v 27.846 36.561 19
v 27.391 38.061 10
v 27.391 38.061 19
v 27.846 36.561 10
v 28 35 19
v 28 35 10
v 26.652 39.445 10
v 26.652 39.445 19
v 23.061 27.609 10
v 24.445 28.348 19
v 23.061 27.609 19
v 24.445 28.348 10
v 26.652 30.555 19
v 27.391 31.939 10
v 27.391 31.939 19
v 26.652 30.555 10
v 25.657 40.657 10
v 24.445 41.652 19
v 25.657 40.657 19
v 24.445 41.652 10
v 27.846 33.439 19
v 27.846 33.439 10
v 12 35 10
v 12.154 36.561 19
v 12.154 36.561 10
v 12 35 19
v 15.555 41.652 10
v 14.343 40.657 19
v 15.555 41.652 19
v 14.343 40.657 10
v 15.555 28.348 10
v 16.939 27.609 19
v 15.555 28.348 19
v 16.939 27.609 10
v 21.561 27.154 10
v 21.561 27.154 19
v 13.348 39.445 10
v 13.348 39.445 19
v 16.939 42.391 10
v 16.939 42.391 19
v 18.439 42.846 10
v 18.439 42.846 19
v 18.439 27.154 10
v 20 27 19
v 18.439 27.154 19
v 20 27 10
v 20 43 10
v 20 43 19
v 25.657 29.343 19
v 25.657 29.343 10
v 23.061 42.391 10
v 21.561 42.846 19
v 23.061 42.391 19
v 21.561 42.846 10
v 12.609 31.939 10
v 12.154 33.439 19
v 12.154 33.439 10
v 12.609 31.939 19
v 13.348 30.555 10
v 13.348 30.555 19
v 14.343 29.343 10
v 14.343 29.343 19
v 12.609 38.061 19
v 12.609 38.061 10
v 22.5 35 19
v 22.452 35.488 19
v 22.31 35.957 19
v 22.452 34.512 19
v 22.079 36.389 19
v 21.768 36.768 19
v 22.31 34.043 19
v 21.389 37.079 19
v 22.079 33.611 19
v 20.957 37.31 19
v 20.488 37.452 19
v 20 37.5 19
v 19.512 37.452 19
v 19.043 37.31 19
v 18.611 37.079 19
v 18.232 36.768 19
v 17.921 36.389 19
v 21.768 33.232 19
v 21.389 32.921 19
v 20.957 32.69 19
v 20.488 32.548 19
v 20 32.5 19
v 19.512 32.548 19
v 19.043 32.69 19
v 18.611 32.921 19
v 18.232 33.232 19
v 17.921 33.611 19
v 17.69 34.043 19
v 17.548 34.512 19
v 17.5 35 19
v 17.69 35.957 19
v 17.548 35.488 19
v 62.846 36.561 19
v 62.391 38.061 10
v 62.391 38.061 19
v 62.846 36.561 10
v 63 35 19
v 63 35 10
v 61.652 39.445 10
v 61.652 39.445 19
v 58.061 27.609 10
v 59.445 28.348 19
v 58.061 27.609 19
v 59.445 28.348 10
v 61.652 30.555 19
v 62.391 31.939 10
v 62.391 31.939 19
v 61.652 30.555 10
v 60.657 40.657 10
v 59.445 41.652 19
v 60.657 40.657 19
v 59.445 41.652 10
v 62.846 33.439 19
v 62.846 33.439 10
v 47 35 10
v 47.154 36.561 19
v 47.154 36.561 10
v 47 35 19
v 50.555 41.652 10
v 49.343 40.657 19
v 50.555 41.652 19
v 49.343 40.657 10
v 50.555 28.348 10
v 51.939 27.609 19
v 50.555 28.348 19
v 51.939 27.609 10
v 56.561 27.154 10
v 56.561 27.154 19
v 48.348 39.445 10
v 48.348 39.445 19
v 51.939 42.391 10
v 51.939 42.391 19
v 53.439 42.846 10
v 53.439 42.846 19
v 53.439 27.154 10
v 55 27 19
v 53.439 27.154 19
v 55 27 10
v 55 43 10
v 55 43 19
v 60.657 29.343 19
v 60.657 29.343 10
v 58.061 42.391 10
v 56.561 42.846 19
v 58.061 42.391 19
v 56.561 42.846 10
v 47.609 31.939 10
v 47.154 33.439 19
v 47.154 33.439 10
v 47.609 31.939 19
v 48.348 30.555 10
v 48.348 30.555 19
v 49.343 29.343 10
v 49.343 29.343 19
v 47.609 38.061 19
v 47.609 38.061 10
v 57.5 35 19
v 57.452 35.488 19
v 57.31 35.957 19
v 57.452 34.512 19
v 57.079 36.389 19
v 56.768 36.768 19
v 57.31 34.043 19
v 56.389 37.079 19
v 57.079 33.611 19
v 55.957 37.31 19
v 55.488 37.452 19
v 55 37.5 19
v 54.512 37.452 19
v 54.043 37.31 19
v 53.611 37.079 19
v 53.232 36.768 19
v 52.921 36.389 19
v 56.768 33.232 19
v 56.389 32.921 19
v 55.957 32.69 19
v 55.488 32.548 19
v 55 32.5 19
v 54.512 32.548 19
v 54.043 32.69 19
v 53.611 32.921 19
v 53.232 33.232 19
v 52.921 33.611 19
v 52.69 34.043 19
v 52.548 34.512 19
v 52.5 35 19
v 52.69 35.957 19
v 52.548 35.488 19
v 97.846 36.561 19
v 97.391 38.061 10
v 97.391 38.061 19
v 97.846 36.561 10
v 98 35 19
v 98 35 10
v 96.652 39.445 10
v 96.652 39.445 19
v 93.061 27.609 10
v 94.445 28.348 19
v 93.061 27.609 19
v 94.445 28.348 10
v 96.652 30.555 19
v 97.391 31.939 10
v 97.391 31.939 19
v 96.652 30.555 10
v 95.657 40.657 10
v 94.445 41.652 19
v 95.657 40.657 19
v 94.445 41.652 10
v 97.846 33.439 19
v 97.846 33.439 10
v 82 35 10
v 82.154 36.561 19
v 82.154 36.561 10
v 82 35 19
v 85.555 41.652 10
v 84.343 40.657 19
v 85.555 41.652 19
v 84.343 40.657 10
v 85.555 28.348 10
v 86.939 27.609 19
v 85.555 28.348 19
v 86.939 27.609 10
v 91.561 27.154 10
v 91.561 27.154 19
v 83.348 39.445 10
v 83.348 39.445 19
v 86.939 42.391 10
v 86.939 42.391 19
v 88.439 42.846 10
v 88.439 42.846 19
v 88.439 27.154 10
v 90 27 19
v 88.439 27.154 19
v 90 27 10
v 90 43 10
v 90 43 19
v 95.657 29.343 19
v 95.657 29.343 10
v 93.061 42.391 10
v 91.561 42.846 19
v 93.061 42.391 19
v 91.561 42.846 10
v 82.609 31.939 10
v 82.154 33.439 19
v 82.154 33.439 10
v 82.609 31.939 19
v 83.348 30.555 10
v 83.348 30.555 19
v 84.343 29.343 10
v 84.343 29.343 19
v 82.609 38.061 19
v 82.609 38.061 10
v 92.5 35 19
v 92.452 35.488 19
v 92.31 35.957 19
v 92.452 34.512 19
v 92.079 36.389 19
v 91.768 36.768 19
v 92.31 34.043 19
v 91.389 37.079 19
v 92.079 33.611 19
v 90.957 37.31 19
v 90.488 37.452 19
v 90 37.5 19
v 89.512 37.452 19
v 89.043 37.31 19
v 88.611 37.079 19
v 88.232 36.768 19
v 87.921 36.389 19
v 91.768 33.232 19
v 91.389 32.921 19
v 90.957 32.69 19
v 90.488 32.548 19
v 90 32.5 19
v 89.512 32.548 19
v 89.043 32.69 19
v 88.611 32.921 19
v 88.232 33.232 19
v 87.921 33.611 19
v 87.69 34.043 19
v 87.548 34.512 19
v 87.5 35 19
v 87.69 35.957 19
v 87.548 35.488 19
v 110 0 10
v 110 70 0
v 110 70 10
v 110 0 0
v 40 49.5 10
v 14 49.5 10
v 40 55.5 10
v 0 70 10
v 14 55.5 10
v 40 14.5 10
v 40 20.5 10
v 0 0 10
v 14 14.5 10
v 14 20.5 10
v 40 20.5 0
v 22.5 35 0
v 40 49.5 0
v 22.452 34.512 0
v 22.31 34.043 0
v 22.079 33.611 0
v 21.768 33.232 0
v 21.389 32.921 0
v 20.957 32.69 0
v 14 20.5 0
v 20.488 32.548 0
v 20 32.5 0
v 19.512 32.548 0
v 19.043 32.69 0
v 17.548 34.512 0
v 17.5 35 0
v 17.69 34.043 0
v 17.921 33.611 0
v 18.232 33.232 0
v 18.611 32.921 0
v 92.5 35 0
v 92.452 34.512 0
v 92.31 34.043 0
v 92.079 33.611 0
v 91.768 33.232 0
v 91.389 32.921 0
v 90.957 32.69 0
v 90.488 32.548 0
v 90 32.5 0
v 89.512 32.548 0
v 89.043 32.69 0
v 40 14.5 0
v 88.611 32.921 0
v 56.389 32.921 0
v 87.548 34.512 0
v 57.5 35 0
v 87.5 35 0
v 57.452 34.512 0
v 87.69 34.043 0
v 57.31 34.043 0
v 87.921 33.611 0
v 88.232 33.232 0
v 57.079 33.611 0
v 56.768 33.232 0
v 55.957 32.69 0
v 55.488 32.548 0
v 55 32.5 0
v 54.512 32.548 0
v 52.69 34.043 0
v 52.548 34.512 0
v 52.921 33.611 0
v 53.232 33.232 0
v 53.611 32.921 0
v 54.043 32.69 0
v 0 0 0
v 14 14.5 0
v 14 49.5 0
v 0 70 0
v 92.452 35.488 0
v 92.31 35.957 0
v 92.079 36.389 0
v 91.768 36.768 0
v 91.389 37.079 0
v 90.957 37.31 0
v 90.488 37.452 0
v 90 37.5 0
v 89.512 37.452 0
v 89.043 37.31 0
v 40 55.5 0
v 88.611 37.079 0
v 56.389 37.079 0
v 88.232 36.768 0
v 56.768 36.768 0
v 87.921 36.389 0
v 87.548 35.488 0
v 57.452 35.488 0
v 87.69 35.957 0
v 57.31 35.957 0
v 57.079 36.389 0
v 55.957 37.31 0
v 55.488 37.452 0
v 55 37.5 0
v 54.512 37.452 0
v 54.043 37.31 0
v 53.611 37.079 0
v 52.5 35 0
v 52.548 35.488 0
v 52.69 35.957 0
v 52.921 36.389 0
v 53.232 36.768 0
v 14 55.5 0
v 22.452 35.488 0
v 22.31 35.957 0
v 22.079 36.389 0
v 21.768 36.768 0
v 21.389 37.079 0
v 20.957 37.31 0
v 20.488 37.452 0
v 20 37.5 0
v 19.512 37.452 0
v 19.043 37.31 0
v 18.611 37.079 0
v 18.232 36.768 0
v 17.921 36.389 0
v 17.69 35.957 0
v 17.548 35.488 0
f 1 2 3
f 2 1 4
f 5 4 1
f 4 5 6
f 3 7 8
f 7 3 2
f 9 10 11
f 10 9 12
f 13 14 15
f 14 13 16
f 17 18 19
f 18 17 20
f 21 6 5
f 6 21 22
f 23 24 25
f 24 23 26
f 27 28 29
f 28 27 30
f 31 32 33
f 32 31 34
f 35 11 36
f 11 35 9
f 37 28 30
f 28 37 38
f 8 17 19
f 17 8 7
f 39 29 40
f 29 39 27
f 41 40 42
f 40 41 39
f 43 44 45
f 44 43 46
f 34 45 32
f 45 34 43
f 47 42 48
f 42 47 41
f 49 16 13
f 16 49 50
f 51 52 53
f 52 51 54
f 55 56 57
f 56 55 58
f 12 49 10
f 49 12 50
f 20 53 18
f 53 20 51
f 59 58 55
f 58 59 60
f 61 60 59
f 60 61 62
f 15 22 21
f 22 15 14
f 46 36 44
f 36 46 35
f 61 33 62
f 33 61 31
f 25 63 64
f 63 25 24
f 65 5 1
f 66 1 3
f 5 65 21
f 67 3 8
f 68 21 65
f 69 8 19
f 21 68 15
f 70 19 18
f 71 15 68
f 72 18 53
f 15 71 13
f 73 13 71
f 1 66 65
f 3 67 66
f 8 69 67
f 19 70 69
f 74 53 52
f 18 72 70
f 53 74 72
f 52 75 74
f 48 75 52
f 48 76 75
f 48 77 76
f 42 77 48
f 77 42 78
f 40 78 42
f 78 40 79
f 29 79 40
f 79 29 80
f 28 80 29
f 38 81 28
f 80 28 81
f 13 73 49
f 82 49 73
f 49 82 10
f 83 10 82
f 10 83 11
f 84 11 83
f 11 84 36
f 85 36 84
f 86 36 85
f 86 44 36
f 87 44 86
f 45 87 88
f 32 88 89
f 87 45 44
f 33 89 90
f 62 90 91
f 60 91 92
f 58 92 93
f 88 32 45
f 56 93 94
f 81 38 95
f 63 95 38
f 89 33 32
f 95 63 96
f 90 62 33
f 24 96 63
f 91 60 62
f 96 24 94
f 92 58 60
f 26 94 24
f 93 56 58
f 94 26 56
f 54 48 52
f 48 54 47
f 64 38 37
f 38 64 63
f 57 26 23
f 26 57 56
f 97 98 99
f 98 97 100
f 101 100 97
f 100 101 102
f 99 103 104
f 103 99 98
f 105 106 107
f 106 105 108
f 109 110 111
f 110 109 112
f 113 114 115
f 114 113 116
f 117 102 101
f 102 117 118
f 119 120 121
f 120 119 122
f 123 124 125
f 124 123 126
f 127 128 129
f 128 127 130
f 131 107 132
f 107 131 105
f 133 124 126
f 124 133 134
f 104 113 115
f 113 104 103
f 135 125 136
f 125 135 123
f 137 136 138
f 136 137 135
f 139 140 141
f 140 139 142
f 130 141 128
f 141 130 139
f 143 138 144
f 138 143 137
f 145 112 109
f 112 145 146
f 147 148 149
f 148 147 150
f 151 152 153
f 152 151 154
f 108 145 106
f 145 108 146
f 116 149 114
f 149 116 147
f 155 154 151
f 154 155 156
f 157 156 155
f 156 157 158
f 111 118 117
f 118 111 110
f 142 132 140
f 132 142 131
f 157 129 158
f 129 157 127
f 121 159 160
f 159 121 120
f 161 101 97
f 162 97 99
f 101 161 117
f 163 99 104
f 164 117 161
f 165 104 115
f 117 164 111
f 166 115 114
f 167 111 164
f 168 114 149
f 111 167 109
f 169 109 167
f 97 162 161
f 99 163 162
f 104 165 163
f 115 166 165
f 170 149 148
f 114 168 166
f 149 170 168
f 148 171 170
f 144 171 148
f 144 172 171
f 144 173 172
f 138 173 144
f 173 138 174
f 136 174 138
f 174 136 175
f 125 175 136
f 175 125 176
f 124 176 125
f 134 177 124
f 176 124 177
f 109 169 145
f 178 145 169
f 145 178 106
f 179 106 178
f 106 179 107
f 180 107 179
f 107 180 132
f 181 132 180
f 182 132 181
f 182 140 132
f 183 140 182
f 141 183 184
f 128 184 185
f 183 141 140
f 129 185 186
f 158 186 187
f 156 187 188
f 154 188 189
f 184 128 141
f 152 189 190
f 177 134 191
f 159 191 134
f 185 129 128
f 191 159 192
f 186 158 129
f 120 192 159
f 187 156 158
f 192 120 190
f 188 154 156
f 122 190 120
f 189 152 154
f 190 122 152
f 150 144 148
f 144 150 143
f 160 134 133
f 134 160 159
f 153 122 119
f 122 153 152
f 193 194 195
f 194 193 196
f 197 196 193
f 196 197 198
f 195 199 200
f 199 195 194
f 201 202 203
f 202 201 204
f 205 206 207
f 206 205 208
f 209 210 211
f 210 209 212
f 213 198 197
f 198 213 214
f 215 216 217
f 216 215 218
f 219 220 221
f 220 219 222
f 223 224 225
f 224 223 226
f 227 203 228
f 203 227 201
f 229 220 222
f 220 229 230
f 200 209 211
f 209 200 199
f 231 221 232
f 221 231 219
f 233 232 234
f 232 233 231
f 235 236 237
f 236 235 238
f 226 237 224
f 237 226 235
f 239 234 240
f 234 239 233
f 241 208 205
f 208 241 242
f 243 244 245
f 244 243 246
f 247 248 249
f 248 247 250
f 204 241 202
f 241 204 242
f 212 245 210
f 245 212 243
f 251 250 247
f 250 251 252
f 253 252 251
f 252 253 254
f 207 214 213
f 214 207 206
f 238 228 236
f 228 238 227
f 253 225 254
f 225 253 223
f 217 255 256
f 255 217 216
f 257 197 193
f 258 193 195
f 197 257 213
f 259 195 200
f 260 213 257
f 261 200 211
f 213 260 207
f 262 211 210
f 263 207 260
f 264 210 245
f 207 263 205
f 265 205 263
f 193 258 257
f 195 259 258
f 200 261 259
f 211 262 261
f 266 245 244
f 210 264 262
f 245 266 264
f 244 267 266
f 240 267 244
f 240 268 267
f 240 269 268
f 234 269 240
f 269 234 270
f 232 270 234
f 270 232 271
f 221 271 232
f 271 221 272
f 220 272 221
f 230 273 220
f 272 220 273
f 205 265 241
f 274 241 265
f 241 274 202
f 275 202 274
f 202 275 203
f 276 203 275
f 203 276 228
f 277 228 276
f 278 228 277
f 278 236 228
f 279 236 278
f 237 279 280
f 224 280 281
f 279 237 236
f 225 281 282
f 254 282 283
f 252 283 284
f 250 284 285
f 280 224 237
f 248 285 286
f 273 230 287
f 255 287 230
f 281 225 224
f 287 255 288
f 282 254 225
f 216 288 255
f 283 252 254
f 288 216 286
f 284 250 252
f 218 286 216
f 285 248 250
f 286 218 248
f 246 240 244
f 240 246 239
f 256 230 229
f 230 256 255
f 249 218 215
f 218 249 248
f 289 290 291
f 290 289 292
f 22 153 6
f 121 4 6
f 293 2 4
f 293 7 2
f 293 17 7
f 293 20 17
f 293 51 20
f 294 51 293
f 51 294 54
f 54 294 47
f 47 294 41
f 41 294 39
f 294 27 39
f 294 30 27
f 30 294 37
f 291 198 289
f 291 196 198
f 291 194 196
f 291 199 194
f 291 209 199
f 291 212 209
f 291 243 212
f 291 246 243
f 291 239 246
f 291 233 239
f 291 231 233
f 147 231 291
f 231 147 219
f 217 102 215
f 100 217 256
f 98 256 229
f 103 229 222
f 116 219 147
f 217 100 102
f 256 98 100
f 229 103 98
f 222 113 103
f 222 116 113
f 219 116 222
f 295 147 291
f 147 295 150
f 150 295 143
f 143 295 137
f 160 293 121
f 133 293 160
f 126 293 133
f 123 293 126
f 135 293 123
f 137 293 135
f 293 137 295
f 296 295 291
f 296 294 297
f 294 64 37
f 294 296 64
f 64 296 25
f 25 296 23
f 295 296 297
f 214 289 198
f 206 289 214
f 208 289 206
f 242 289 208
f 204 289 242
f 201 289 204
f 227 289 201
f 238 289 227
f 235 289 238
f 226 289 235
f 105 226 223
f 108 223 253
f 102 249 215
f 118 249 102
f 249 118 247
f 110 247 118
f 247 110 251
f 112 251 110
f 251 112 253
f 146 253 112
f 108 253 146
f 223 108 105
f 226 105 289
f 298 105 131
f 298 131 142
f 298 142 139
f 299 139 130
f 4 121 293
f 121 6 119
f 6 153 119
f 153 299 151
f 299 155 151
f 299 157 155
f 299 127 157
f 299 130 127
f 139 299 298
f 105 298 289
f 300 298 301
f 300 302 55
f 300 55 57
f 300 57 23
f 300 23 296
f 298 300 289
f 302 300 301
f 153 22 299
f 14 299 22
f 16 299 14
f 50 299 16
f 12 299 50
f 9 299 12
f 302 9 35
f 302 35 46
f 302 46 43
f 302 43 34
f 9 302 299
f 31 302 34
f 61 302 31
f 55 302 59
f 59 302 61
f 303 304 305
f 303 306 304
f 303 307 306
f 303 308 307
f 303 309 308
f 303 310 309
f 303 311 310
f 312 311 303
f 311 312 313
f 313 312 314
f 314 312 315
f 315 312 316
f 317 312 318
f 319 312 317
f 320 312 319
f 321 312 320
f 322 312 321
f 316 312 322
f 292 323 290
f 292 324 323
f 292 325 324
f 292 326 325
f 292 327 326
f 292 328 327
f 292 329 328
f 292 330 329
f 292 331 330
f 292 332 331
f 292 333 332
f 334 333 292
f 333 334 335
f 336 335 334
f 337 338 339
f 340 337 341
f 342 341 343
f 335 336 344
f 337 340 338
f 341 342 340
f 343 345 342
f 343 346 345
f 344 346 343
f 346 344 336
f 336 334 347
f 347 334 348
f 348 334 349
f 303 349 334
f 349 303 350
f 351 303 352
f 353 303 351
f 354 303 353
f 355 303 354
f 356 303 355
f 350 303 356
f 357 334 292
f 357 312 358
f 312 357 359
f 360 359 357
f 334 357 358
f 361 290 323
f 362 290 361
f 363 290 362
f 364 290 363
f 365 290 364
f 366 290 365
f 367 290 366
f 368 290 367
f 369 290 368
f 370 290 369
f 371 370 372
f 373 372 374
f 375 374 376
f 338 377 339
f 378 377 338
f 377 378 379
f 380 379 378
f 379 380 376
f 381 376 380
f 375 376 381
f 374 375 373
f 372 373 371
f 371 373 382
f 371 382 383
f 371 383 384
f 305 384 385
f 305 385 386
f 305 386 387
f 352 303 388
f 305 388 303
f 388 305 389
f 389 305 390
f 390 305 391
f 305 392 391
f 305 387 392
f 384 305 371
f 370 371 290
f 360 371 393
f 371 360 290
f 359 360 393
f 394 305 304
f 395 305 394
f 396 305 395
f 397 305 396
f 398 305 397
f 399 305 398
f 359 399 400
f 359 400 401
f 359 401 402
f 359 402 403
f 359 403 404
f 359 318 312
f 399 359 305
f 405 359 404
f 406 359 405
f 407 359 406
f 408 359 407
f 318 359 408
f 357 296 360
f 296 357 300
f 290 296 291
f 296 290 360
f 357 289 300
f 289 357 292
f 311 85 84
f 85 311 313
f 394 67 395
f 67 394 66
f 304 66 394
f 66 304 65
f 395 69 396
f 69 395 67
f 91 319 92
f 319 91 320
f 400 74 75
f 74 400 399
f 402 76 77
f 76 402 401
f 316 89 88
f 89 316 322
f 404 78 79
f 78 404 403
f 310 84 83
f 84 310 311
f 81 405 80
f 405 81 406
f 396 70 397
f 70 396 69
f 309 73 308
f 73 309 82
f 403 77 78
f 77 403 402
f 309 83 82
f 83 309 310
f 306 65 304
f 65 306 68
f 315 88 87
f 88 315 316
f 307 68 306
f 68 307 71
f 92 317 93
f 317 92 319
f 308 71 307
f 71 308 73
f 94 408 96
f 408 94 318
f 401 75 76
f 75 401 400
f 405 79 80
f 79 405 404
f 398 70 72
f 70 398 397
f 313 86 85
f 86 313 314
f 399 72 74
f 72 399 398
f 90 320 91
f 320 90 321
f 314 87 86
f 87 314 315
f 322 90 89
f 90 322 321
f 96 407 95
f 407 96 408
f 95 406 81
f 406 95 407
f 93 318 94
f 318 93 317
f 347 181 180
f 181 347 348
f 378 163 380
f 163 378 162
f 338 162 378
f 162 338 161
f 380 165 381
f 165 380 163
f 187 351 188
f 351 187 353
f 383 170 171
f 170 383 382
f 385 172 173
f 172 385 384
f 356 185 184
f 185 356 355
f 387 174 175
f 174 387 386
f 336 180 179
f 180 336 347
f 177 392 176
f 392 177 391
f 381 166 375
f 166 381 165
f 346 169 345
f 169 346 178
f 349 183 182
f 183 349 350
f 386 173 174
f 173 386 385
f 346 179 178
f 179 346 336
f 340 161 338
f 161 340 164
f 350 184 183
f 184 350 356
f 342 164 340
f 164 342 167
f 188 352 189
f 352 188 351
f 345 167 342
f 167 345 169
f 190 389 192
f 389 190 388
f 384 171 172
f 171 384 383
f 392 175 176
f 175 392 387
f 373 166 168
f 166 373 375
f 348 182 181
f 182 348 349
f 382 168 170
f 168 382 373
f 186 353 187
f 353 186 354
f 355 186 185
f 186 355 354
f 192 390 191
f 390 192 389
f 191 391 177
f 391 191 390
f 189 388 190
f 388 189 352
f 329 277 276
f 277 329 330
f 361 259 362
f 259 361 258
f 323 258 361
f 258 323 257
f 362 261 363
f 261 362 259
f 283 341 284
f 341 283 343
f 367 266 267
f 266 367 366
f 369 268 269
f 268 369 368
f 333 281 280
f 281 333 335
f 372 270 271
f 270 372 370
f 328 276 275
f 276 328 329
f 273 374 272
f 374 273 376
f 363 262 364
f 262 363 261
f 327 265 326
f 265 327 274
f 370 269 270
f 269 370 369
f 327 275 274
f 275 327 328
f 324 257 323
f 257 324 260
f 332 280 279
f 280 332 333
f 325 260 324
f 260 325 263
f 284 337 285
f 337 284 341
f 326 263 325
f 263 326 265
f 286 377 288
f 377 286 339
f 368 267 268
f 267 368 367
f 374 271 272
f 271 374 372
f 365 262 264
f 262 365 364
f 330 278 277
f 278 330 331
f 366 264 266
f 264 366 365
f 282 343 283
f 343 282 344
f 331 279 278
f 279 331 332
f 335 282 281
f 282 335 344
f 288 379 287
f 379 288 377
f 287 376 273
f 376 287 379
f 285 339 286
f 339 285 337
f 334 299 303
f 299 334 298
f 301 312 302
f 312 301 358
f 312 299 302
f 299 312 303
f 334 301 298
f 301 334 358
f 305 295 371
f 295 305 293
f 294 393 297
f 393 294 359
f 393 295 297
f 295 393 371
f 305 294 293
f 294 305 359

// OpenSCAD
$fn = 32;

// ----------------------------------------------------------------------
// Drill jig: three_boss_slot jig
// ----------------------------------------------------------------------

// --- parameters (mm) ---
plate_l = 110;            // plate length, X
plate_w = 70;             // plate width, Y
plate_t = 10;             // plate thickness
boss_d = 16;              // guide boss diameter
boss_h = 10;              // boss height above the plate
guide_d = 5;              // guide hole diameter
boss_pitch = 35;          // boss pitch
slot_w = 6;               // clamp slot width
slot_l = 26;              // clamp slot length
slot_x = 14;              // slot start X

n_boss = 3;  // guide bosses
boss_x0 = (plate_l - (n_boss - 1) * boss_pitch) / 2;  // first boss X
boss_top = plate_t - 1 + boss_h;  // boss crown height
total_h = boss_top;  // overall height

difference() {
  union() {
  cube([plate_l, plate_w, plate_t]);
  for (i = [0 : n_boss - 1])
    translate([boss_x0 + i * boss_pitch, plate_w / 2, plate_t - 1])
      cylinder(h = boss_h, d = boss_d);
  }
  for (i = [0 : n_boss - 1])
    translate([boss_x0 + i * boss_pitch, plate_w / 2, -1])
      cylinder(h = plate_t + boss_h, d = guide_d);
  for (cy = [plate_w * 0.25, plate_w * 0.75])
    translate([slot_x, cy - slot_w / 2, -1])
      cube([slot_l, slot_w, plate_t + 2]);
}
